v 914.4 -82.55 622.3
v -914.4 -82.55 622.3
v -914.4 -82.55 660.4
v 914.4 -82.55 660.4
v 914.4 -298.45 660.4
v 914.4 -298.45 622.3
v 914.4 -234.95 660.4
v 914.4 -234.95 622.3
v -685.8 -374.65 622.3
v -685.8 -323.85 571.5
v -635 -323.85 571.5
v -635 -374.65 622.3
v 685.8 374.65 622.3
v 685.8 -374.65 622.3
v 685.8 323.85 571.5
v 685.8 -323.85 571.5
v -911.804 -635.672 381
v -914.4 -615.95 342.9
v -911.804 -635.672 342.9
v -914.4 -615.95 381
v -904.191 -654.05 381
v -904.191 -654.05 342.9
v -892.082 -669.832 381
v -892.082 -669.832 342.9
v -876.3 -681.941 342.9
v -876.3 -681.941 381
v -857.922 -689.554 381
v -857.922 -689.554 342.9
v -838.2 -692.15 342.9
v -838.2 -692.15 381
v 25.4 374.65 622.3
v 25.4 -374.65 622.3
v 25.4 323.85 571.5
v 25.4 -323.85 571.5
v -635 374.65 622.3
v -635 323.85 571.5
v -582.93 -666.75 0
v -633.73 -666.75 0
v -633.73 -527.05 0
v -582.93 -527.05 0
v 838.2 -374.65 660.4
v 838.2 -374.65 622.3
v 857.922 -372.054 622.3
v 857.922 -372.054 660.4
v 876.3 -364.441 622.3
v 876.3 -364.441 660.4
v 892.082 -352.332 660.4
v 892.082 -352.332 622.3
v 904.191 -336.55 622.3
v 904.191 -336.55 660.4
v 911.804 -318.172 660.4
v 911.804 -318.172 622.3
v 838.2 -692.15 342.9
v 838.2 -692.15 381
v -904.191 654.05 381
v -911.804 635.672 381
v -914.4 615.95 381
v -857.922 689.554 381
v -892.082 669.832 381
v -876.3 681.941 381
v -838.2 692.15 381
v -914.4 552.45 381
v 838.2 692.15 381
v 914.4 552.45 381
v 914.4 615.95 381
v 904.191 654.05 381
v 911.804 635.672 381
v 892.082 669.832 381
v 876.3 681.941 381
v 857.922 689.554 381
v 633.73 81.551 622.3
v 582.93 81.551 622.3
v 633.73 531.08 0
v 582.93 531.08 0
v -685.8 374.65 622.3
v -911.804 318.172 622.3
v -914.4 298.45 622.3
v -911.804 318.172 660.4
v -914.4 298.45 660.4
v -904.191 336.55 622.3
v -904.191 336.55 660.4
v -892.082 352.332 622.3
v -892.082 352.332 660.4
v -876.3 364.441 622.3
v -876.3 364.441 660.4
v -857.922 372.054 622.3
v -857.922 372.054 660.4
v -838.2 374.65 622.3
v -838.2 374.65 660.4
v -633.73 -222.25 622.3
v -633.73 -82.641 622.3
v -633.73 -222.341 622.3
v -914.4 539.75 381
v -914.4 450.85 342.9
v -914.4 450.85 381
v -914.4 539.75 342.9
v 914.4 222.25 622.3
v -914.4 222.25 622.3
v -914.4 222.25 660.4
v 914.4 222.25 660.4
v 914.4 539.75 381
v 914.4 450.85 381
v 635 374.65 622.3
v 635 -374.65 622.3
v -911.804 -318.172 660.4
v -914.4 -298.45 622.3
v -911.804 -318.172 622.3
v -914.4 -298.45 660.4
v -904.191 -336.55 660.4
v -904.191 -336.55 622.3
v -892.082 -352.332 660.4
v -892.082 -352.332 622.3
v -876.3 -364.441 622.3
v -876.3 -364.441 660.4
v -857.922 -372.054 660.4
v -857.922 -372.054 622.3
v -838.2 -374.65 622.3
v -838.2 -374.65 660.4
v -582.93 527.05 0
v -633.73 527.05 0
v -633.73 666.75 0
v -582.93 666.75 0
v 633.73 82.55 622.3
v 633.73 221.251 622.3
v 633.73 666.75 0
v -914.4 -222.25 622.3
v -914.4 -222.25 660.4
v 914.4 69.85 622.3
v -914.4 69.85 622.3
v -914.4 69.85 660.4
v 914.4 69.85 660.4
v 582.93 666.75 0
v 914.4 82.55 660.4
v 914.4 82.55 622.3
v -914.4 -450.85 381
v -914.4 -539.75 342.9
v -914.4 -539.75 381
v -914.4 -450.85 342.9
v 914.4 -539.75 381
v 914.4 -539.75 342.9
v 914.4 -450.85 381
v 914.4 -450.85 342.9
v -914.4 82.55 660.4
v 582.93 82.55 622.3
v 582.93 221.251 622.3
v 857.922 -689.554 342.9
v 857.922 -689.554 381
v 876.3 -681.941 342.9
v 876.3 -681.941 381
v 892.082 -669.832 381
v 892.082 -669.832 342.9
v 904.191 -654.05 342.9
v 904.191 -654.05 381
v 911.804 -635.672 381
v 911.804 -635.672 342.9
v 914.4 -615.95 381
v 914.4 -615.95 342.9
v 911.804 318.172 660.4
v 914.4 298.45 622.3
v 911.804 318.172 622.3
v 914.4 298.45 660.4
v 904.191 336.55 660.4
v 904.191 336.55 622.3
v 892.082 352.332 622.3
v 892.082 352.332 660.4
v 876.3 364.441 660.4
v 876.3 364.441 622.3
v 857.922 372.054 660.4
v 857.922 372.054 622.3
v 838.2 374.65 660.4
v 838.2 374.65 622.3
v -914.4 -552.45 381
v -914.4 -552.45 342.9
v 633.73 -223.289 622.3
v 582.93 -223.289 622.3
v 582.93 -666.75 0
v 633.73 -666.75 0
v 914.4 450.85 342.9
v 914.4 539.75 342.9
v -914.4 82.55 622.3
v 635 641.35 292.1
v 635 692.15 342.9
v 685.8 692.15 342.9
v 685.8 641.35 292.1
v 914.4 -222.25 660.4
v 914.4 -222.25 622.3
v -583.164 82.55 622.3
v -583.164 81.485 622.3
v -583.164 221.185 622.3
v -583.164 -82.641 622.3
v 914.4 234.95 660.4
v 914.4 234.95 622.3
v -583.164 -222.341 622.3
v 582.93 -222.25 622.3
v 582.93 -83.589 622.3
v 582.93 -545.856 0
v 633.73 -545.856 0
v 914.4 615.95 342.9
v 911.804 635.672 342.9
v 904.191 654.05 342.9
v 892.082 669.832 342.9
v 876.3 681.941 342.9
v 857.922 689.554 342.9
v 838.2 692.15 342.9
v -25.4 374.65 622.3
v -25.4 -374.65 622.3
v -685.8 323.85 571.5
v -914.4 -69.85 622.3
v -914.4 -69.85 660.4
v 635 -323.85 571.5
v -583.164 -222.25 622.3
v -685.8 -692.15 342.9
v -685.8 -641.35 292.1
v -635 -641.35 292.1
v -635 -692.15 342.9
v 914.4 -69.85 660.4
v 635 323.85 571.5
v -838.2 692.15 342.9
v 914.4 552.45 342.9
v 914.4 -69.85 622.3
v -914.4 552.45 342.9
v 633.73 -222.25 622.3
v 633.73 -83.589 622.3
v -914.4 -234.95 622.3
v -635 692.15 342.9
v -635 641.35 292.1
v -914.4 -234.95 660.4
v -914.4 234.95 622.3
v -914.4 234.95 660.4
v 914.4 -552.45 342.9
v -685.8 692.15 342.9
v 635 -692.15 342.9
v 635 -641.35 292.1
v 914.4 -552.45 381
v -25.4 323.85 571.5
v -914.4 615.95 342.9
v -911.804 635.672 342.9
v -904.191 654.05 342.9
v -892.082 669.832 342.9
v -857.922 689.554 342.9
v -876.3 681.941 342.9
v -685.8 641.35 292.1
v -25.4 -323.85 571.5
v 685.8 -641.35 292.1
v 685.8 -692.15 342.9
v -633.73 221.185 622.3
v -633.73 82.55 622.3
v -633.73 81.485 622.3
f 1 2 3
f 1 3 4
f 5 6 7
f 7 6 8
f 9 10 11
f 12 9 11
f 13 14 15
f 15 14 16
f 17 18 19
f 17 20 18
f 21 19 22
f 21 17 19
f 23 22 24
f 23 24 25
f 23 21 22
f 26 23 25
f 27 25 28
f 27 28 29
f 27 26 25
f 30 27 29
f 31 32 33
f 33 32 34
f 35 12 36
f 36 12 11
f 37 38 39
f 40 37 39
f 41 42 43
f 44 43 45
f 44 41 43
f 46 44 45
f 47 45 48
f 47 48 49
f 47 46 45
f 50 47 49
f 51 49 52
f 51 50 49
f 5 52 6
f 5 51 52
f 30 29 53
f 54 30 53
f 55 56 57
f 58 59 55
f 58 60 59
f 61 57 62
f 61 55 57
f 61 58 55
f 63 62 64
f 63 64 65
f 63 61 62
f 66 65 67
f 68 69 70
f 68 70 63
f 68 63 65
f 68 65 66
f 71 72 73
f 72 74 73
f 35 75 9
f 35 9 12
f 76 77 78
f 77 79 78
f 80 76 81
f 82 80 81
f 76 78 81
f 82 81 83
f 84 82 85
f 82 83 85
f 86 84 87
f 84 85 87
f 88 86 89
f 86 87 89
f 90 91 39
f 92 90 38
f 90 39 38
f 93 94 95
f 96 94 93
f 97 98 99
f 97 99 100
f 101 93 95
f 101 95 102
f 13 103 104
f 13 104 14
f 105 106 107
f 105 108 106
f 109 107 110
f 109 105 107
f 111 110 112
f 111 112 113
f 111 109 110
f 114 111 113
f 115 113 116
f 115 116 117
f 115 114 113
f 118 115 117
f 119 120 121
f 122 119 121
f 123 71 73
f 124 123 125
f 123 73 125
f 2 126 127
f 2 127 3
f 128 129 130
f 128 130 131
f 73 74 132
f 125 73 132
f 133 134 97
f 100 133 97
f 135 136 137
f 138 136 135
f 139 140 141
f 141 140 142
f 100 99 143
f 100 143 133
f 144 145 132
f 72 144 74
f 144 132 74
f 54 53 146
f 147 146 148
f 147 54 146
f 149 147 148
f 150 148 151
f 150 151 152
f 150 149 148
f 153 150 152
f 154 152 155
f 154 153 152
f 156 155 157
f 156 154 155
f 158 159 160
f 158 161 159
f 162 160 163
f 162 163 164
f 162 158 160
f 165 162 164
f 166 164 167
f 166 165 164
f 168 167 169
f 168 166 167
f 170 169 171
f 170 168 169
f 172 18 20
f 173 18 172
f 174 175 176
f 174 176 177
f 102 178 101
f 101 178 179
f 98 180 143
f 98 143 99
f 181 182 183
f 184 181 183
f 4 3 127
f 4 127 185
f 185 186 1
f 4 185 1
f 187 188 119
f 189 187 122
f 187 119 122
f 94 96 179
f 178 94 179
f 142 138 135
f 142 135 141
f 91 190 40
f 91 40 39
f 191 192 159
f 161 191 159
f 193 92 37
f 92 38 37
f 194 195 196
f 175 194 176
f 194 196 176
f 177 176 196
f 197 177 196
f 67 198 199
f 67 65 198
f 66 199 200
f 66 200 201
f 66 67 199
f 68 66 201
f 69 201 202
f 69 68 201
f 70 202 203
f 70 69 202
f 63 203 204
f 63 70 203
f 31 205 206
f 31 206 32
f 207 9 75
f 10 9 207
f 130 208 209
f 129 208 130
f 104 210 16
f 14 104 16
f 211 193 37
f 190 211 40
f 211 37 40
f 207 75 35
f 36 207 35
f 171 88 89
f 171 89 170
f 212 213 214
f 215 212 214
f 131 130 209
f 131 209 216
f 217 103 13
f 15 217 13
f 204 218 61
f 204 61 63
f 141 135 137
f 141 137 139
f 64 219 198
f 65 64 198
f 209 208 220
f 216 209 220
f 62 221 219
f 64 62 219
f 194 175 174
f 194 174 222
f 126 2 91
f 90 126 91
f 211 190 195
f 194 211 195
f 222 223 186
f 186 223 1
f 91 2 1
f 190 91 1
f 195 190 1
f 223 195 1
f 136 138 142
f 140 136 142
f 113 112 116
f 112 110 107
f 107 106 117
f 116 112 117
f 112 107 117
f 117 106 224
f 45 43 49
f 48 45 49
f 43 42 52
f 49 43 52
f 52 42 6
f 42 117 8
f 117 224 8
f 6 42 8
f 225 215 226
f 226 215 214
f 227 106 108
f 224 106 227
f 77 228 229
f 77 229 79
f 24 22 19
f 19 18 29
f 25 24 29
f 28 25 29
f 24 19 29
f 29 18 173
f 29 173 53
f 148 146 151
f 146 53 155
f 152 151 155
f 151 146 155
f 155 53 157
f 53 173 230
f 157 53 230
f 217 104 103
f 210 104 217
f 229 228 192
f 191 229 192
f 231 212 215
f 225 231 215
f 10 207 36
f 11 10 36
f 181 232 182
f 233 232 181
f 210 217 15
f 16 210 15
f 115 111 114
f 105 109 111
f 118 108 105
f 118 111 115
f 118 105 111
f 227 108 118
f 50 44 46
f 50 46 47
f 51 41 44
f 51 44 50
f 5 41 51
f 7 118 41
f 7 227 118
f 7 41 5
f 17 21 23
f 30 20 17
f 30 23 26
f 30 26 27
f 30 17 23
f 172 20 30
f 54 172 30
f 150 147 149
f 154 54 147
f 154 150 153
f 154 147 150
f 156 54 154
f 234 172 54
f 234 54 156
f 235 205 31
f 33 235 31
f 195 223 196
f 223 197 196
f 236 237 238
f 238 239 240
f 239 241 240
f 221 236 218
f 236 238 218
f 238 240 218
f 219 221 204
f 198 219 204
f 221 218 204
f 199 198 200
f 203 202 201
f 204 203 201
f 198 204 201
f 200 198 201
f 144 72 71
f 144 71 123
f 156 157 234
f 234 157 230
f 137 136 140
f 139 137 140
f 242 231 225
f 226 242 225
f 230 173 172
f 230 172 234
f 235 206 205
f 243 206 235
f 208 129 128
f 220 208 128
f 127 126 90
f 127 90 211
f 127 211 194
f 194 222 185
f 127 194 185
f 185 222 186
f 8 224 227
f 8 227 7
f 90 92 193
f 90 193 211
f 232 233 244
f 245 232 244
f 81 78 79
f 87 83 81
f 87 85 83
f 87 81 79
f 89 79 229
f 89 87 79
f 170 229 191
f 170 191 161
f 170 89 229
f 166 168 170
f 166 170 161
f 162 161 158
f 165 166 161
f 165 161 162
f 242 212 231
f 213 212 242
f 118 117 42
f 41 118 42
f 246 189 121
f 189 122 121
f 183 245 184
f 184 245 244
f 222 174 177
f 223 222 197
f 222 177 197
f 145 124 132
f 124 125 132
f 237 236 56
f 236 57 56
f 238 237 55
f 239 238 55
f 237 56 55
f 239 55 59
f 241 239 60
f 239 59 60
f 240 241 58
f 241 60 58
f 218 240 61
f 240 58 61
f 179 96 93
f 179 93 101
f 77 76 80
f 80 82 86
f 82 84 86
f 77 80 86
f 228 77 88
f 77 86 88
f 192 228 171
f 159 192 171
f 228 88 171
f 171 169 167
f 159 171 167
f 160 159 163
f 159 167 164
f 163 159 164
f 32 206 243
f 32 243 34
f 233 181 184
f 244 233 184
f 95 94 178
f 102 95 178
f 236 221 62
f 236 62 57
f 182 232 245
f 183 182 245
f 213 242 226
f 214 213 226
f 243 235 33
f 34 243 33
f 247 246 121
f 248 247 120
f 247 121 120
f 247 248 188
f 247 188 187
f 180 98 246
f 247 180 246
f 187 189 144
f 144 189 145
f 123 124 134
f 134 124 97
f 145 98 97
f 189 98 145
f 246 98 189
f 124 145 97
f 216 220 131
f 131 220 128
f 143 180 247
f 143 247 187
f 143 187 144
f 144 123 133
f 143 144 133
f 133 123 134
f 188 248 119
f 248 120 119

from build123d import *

# Parameters (mm, degrees)
F3_W       = 1828.8
F3_H       = 139.7
F4_DEPTH   = 38.1
F2_W       = 1828.8
F2_H       = 139.7
F5_R       = 76.2
F5_2_R     = 76.2
F6_W       = 1828.8
F6_H       = 88.9
F7_DEPTH   = 38.1
F6_H_2     = 139.7
F8_R       = 76.2
F8_2_R     = 76.2
F9_W       = 50.8
F9_H       = 749.3
F10_DEPTH  = 50.8
F12_SIZE   = 50.79999
F12_2_SIZE = 50.79999
F12_3_SIZE = 50.79999
F11_W      = 50.8
F11_H      = 1384.3
F13_DEPTH  = 50.8
F14_SIZE   = 50.79999
F14_2_SIZE = 50.79999
F15_W      = 50.8
F15_H      = 139.7
F16_W      = 50.8
F16_H      = 135.6702318695
F15_W_2    = 50.5662006634
F16_H_2    = 139.7
F16_H_3    = 120.8942294282


# Not quite as in the source:
# - a fillet or chamfer is up to 0.001 mm smaller than in the source, because OpenCascade refuses the exact size


with BuildPart() as f4:
    # F3 (on offset) → F4 (new body)
    with BuildSketch(Plane.XY.offset(622.3)):
        with Locations((0, 304.8)):
            Rectangle(F3_W, F3_H)
    extrude(amount=F4_DEPTH)

    # F5#2
    f5_2_edges = [f4.edges().sort_by_distance(p)[0] for p in [
        (914.4, 374.65, 641.35),
        (-914.4, 374.65, 641.35),
    ]]
    fillet(f5_2_edges, radius=F5_2_R)


with BuildPart() as f4b:
    # F3 (on offset) → F4, piece 2 (new body)
    with BuildSketch(Plane.XY.offset(622.3)):
        with Locations((0, 152.4)):
            Rectangle(F3_W, F3_H)
    extrude(amount=F4_DEPTH)

    # F15 (on offset) → F17 section 0
    with BuildSketch(Plane.XY.offset(622.3)):
        with Locations((608.33, 151.4005087376)):
            Rectangle(F15_W, F15_H)
    # F16 (on Top) → F17 section 1
    with BuildSketch(Plane.XY):
        with Locations((608.33, 598.9148840653)):
            Rectangle(F16_W, F16_H)
    loft()

    # F15 (on offset) → F18 section 0
    with BuildSketch(Plane.XY.offset(622.3)):
        with Locations((-608.4468996683, 151.3350016614)):
            Rectangle(F15_W_2, F15_H)
    # F16 (on Top) → F18 section 1
    with BuildSketch(Plane.XY):
        with Locations((-608.33, 596.9)):
            Rectangle(F16_W, F16_H_2)
    loft()


with BuildPart() as f4c:
    # F3 (on offset) → F4, piece 3 (new body)
    with BuildSketch(Plane.XY.offset(622.3)):
        with Locations((0, -152.4)):
            Rectangle(F3_W, F3_H)
    extrude(amount=F4_DEPTH)

    # F15 (on offset) → F19 section 0
    with BuildSketch(Plane.XY.offset(622.3)):
        with Locations((608.33, -153.4392811298)):
            Rectangle(F15_W, F15_H)
    # F16 (on Top) → F19 section 1
    with BuildSketch(Plane.XY):
        with Locations((608.33, -606.3028852859)):
            Rectangle(F16_W, F16_H_3)
    loft()

    # F15 (on offset) → F20 section 0
    with BuildSketch(Plane.XY.offset(622.3)):
        with Locations((-608.4468996683, -152.4910742103)):
            Rectangle(F15_W_2, F15_H)
    # F16 (on Top) → F20 section 1
    with BuildSketch(Plane.XY):
        with Locations((-608.33, -596.9)):
            Rectangle(F16_W, F16_H_2)
    loft()


with BuildPart() as f4d:
    # F3 (on offset) → F4, piece 4 (new body)
    with BuildSketch(Plane.XY.offset(622.3)):
        with Locations((0, -304.8)):
            Rectangle(F3_W, F3_H)
    extrude(amount=F4_DEPTH)

    # F5
    f5_edges = [f4d.edges().sort_by_distance(p)[0] for p in [
        (914.4, -374.65, 641.35),
        (-914.4, -374.65, 641.35),
    ]]
    fillet(f5_edges, radius=F5_R)


with BuildPart() as f4e:
    # F2 (on offset) → F4, piece 5 (new body)
    with BuildSketch(Plane.XY.offset(622.3)):
        Rectangle(F2_W, F2_H)
    extrude(amount=F4_DEPTH)


with BuildPart() as f7:
    # F6 (on offset) → F7 (new body)
    with BuildSketch(Plane.XY.offset(342.9)):
        with Locations((0, 495.3)):
            Rectangle(F6_W, F6_H)
    extrude(amount=F7_DEPTH)


with BuildPart() as f7b:
    # F6 (on offset) → F7, piece 2 (new body)
    with BuildSketch(Plane.XY.offset(342.9)):
        with Locations((0, -495.3)):
            Rectangle(F6_W, F6_H)
    extrude(amount=F7_DEPTH)


with BuildPart() as f7c:
    # F6 (on offset) → F7, piece 3 (new body)
    with BuildSketch(Plane.XY.offset(342.9)):
        with Locations((0, 622.3)):
            Rectangle(F6_W, F6_H_2)
    extrude(amount=F7_DEPTH)

    # F8#2
    f8_2_edges = [f7c.edges().sort_by_distance(p)[0] for p in [
        (-914.4, 692.15, 361.95),
        (914.4, 692.15, 361.95),
    ]]
    fillet(f8_2_edges, radius=F8_2_R)


with BuildPart() as f7d:
    # F6 (on offset) → F7, piece 4 (new body)
    with BuildSketch(Plane.XY.offset(342.9)):
        with Locations((0, -622.3)):
            Rectangle(F6_W, F6_H_2)
    extrude(amount=F7_DEPTH)

    # F8
    f8_edges = [f7d.edges().sort_by_distance(p)[0] for p in [
        (-914.4, -692.15, 361.95),
        (914.4, -692.15, 361.95),
    ]]
    fillet(f8_edges, radius=F8_R)


with BuildPart() as f10:
    # F9 (on offset) → F10 (new body)
    with BuildSketch(Plane.XY.offset(622.3)):
        with Locations((-660.4, 0)):
            Rectangle(F9_W, F9_H)
    extrude(amount=-F10_DEPTH)

    # F12 (size 50.8 in the source; OpenCascade refuses exactly that, so slightly less here)
    f12_edges = [f10.edges().sort_by_distance(p)[0] for p in [
        (-660.4, -374.65, 571.5),
        (-660.4, 374.65, 571.5),
    ]]
    chamfer(f12_edges, length=F12_SIZE)


with BuildPart() as f10b:
    # F9 (on offset) → F10, piece 2 (new body)
    with BuildSketch(Plane.XY.offset(622.3)):
        with Locations((660.4, 0)):
            Rectangle(F9_W, F9_H)
    extrude(amount=-F10_DEPTH)

    # F12#3 (size 50.8 in the source; OpenCascade refuses exactly that, so slightly less here)
    f12_3_edges = [f10b.edges().sort_by_distance(p)[0] for p in [
        (660.4, -374.65, 571.5),
        (660.4, 374.65, 571.5),
    ]]
    chamfer(f12_3_edges, length=F12_3_SIZE)


with BuildPart() as f10c:
    # F9 (on offset) → F10, piece 3 (new body)
    with BuildSketch(Plane.XY.offset(622.3)):
        Rectangle(F9_W, F9_H)
    extrude(amount=-F10_DEPTH)

    # F12#2 (size 50.8 in the source; OpenCascade refuses exactly that, so slightly less here)
    f12_2_edges = [f10c.edges().sort_by_distance(p)[0] for p in [
        (0, -374.65, 571.5),
        (0, 374.65, 571.5),
    ]]
    chamfer(f12_2_edges, length=F12_2_SIZE)


with BuildPart() as f13:
    # F11 (on offset) → F13 (new body)
    with BuildSketch(Plane.XY.offset(342.9)):
        with Locations((-660.4, 0)):
            Rectangle(F11_W, F11_H)
    extrude(amount=-F13_DEPTH)

    # F14 (size 50.8 in the source; OpenCascade refuses exactly that, so slightly less here)
    f14_edges = [f13.edges().sort_by_distance(p)[0] for p in [
        (-660.4, -692.15, 292.1),
        (-660.4, 692.15, 292.1),
    ]]
    chamfer(f14_edges, length=F14_SIZE)


with BuildPart() as f13b:
    # F11 (on offset) → F13, piece 2 (new body)
    with BuildSketch(Plane.XY.offset(342.9)):
        with Locations((660.4, 0)):
            Rectangle(F11_W, F11_H)
    extrude(amount=-F13_DEPTH)

    # F14#2 (size 50.8 in the source; OpenCascade refuses exactly that, so slightly less here)
    f14_2_edges = [f13b.edges().sort_by_distance(p)[0] for p in [
        (660.4, -692.15, 292.1),
        (660.4, 692.15, 292.1),
    ]]
    chamfer(f14_2_edges, length=F14_2_SIZE)


solid = Compound([f4.part, f4b.part, f4c.part, f4d.part, f4e.part, f7.part, f7b.part, f7c.part, f7d.part, f10.part, f10b.part, f10c.part, f13.part, f13b.part])
